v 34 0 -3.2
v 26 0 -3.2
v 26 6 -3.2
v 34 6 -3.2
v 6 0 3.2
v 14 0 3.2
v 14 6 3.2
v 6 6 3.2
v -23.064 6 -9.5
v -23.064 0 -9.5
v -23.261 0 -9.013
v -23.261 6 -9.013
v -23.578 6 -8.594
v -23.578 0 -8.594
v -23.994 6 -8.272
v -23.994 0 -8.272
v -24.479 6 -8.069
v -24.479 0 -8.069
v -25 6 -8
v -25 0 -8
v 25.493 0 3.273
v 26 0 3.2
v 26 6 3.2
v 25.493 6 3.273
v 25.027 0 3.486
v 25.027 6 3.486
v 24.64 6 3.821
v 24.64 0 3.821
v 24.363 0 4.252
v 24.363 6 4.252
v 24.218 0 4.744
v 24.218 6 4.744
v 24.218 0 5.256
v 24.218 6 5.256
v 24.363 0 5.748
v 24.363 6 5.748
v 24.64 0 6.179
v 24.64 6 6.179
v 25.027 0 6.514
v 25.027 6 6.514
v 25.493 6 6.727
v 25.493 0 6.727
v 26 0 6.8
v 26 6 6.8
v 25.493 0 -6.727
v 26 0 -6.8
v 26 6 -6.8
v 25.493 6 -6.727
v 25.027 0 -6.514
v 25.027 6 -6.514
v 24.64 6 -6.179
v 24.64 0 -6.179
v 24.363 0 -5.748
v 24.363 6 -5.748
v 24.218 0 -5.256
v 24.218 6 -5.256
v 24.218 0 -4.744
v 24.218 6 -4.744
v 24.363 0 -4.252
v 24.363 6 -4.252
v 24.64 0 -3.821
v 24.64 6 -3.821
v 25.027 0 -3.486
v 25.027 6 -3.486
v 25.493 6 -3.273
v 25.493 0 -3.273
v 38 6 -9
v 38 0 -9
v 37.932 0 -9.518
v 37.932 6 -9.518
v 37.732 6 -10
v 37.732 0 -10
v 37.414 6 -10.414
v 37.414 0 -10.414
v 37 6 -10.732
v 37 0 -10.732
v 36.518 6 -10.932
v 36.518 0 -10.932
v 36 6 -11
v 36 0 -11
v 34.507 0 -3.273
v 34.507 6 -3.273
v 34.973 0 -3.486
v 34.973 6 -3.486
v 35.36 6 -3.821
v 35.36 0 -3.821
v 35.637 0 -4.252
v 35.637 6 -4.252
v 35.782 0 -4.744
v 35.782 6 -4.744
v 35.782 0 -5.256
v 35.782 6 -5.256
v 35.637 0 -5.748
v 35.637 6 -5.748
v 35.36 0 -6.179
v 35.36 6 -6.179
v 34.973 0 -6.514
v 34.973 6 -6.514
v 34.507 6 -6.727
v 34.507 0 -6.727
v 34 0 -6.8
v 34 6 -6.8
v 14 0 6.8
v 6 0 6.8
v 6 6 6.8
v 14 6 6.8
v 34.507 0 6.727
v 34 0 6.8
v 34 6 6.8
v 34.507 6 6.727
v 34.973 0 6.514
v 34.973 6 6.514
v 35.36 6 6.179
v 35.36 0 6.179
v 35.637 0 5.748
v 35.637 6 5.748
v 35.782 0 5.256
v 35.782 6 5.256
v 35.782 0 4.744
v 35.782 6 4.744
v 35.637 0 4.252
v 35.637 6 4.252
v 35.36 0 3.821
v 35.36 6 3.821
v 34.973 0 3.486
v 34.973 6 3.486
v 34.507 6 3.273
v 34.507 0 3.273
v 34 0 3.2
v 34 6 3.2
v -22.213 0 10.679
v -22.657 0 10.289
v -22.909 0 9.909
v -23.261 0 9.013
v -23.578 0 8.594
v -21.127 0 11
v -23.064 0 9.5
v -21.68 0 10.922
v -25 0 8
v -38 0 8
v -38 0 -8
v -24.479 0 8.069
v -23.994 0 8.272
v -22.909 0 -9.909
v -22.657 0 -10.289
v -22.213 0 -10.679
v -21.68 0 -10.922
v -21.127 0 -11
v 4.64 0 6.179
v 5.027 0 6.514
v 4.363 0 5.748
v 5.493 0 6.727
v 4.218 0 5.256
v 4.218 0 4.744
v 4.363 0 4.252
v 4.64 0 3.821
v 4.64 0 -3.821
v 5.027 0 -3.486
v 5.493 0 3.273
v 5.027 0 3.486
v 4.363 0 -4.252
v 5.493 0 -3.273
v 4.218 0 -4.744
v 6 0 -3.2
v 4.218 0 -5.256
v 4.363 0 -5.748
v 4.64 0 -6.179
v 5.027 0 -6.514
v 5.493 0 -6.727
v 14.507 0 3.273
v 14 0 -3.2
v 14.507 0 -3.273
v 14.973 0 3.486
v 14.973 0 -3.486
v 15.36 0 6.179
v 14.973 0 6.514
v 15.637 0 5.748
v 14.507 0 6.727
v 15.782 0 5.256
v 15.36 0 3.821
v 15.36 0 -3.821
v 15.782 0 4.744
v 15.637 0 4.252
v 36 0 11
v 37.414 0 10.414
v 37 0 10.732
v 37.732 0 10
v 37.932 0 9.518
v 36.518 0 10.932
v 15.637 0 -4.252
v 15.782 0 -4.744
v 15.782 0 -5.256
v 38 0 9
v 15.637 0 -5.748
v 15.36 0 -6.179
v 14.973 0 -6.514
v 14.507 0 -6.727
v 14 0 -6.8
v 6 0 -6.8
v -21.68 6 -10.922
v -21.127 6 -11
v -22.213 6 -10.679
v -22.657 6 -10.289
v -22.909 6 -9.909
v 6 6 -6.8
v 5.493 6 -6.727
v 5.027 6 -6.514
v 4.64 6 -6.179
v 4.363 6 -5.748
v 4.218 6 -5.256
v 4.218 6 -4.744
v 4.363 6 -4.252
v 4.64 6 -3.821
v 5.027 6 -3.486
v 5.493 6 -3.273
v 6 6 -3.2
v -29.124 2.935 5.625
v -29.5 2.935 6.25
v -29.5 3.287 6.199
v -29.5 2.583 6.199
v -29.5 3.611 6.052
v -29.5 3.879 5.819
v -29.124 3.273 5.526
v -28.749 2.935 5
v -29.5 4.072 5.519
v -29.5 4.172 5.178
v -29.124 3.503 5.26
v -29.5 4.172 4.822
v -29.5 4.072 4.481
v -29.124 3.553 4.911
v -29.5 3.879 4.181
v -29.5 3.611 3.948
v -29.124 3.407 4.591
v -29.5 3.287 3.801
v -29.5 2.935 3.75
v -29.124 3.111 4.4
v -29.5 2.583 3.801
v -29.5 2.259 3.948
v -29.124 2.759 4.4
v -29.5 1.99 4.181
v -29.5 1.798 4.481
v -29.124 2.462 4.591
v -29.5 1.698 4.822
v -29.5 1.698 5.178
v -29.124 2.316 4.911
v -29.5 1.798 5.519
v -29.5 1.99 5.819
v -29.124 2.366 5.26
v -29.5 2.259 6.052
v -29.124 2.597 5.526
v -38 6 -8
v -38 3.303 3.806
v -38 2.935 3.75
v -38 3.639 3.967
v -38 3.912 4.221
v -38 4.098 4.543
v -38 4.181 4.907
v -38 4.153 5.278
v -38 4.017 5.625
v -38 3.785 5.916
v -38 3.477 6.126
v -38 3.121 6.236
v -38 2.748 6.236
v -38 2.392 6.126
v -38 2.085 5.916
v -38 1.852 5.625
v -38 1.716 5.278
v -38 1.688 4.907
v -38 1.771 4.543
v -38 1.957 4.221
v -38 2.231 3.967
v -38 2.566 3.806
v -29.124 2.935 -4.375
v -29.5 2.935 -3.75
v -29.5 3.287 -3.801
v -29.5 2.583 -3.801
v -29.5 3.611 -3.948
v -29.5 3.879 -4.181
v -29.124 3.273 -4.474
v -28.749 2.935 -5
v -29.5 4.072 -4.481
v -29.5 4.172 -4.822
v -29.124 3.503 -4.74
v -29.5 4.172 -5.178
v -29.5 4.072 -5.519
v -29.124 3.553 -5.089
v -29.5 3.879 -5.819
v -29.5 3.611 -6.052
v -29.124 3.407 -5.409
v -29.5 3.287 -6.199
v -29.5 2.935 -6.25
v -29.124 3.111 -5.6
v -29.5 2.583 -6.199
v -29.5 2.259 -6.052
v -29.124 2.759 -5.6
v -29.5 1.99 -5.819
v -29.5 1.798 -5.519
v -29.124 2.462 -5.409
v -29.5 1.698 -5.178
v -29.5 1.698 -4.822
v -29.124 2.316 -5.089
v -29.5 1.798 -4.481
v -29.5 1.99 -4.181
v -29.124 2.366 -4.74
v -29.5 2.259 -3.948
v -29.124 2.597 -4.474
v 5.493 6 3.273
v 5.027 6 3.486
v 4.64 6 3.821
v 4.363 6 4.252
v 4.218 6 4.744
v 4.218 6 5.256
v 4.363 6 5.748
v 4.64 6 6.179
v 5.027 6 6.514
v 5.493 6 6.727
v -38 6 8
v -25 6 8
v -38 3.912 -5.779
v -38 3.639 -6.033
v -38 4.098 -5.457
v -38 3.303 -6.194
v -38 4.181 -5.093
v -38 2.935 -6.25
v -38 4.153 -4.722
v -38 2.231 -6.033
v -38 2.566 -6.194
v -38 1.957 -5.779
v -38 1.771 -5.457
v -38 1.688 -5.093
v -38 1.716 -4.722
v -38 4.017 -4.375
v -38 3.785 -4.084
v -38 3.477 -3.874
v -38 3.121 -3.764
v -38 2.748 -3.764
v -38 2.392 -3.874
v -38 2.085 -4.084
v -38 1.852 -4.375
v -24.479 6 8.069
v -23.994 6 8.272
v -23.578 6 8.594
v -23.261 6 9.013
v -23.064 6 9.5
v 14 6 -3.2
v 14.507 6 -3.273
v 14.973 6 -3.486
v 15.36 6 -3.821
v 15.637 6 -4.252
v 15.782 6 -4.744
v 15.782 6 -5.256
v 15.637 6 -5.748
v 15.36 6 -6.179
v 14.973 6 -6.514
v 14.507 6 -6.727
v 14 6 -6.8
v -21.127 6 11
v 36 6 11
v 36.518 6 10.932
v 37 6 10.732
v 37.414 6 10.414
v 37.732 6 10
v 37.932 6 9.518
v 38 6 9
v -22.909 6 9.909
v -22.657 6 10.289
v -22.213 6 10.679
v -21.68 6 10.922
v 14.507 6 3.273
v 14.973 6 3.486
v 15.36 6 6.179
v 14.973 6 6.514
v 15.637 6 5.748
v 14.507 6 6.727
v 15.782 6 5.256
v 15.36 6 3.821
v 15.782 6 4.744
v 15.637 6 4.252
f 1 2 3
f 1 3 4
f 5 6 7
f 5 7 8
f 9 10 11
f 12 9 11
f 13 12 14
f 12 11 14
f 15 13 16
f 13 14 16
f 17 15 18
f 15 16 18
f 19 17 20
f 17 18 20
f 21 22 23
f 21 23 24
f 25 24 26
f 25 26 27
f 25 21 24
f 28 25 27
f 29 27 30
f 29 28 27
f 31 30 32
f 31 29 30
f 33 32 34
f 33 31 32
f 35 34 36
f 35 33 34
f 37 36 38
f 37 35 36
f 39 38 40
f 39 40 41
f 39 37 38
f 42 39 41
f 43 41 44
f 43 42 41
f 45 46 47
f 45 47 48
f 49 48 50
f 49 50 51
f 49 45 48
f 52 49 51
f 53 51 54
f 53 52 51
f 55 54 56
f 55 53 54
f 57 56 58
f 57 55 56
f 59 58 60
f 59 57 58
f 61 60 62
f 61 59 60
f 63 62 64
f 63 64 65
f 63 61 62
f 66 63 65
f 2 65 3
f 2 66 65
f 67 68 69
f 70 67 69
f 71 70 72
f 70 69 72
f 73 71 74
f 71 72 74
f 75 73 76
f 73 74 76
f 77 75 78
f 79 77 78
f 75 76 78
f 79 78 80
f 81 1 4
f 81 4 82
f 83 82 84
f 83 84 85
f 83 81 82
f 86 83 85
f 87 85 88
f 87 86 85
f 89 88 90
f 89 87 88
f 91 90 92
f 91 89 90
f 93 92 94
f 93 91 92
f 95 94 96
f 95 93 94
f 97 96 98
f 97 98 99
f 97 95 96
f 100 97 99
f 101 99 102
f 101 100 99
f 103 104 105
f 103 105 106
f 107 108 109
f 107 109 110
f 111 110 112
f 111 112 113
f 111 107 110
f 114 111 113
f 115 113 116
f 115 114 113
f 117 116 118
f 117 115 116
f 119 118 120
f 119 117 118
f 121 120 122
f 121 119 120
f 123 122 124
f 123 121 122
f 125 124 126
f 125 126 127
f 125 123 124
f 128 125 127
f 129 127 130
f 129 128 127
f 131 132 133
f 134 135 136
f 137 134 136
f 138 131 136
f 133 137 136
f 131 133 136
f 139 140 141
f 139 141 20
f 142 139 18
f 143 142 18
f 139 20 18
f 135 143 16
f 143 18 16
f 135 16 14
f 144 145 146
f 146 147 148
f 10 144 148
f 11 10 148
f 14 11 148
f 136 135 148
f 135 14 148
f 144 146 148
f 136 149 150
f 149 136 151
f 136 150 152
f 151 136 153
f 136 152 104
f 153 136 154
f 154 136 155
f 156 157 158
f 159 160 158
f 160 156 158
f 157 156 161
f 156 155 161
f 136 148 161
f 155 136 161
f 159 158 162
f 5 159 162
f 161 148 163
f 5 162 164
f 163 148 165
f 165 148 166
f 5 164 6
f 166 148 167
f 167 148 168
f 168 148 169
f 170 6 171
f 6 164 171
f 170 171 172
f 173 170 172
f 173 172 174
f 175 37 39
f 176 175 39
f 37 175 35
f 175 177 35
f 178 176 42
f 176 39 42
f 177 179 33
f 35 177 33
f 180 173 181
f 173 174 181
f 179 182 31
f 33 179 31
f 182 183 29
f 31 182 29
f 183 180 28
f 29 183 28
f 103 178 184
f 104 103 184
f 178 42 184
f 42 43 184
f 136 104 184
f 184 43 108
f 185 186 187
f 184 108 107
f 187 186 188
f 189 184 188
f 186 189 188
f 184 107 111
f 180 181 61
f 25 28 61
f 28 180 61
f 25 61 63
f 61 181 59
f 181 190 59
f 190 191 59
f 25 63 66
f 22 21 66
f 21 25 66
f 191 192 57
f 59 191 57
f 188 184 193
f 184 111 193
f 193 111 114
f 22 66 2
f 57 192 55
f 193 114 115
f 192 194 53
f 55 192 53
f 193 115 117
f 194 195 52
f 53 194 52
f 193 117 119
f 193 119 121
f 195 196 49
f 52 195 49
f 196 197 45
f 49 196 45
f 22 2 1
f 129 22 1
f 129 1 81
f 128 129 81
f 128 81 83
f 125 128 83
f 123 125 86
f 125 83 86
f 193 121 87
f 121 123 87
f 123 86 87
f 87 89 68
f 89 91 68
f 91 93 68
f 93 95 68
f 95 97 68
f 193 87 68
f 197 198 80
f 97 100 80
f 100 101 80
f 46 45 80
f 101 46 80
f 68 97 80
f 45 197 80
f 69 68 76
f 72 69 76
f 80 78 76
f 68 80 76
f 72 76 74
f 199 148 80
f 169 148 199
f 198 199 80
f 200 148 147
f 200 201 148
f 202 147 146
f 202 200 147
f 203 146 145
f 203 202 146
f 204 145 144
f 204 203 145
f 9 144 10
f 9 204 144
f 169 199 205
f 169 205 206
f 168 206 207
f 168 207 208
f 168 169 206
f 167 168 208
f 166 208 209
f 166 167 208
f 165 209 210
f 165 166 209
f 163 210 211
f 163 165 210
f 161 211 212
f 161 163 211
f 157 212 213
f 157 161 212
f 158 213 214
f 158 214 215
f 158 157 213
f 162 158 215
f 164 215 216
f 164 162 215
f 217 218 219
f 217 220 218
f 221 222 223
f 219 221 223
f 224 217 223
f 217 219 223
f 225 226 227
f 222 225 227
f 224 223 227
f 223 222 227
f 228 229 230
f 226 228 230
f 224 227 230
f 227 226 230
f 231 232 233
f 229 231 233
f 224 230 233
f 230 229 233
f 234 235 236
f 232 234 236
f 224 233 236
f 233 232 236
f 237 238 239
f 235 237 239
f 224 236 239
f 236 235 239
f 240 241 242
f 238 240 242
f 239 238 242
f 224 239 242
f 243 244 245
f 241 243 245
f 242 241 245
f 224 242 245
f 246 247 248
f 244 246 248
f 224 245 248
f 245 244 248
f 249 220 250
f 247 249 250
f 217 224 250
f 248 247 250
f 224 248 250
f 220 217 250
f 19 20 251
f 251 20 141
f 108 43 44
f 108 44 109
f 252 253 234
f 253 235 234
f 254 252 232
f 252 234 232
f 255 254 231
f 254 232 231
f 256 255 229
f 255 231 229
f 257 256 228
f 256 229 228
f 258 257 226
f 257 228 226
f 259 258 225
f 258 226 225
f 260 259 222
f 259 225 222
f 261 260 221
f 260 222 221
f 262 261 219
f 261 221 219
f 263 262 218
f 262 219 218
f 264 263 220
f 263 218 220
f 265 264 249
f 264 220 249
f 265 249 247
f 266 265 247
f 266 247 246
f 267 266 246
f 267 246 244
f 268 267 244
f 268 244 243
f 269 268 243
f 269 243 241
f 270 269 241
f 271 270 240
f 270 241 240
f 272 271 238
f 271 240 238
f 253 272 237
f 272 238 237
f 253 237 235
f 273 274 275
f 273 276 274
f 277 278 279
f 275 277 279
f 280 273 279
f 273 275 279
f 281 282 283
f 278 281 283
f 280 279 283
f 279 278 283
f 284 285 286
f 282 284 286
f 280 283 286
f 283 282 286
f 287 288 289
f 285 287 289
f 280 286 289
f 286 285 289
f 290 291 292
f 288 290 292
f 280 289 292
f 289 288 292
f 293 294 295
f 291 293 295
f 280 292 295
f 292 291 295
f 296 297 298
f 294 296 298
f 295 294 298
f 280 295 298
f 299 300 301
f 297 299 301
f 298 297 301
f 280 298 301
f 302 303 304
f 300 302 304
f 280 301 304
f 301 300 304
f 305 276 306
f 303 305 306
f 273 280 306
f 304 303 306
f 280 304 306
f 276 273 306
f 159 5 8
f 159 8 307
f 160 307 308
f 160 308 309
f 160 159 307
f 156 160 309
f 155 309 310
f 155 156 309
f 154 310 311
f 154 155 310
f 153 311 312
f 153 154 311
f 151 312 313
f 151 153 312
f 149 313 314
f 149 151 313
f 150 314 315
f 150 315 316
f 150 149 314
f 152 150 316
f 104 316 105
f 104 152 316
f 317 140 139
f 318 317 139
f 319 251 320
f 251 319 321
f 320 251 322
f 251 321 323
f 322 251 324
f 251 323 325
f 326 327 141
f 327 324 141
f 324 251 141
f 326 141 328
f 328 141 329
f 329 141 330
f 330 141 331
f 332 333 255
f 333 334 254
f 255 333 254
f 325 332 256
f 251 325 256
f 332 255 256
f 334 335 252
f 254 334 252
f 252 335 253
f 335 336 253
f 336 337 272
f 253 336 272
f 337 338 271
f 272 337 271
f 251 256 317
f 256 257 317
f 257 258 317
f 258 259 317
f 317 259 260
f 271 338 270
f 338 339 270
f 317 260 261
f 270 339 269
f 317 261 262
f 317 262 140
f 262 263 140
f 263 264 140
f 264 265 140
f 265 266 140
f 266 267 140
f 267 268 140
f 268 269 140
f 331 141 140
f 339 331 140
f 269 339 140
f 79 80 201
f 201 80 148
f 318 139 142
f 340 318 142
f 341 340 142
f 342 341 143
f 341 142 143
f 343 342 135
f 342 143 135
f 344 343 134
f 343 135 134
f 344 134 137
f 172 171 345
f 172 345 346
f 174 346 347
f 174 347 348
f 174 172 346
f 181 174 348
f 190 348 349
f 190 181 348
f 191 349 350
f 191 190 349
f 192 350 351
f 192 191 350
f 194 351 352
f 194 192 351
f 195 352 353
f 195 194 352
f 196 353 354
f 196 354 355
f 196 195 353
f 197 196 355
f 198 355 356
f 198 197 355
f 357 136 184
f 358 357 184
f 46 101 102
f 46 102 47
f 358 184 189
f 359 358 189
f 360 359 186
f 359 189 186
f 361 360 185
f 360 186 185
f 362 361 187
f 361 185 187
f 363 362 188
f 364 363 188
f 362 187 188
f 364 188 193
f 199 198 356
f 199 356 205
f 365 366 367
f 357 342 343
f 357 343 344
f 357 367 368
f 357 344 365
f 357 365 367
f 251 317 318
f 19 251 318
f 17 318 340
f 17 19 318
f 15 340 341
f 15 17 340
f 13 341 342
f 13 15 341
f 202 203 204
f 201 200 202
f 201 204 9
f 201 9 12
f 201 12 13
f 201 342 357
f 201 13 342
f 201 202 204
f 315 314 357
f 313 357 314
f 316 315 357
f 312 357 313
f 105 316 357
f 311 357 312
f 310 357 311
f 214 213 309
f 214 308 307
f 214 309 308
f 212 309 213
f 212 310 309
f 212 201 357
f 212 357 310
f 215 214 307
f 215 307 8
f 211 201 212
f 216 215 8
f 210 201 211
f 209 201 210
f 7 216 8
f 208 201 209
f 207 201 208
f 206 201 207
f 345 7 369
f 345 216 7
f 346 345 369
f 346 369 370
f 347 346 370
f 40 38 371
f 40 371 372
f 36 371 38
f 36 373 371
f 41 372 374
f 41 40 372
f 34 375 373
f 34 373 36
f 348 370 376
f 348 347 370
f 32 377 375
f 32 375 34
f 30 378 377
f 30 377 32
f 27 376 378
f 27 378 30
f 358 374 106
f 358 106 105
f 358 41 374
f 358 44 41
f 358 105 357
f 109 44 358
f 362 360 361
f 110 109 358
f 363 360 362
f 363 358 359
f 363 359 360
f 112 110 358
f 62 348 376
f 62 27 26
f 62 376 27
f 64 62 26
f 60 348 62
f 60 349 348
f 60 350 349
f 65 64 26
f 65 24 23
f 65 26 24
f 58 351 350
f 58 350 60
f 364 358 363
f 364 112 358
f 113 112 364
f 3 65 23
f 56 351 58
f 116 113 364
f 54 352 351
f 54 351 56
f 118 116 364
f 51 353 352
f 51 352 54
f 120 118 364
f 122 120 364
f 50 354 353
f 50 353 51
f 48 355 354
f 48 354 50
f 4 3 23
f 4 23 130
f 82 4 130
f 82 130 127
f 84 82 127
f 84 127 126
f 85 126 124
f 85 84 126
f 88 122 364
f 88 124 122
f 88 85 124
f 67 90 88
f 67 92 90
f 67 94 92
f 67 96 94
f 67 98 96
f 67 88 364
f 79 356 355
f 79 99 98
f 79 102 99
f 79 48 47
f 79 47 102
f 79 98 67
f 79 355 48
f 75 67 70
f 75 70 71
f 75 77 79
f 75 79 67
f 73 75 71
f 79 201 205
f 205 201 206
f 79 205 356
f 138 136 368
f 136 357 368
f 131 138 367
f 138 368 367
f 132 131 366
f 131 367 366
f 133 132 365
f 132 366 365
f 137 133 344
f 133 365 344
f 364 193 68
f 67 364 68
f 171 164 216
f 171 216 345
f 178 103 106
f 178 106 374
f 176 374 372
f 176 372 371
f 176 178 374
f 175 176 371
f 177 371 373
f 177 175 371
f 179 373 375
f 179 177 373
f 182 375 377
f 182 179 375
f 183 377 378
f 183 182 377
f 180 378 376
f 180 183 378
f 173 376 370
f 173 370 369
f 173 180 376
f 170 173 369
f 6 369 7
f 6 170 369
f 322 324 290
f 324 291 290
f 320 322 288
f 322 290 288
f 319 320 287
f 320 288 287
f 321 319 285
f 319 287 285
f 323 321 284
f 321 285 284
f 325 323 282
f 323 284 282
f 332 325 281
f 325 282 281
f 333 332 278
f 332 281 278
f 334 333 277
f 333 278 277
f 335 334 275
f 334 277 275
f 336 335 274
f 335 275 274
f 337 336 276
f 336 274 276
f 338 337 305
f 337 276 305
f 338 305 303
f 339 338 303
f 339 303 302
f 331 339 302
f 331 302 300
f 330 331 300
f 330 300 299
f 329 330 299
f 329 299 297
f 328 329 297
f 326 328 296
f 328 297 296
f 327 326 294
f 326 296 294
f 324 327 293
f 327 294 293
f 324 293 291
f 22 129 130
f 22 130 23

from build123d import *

# Parameters (mm, degrees)
BOSS_EXTRUDE1_DEPTH      = 6
M3_CLEARANCE_SLOT1_DEPTH = 6
M3_TAPPED_HOLE1_D        = 2.5
M3_TAPPED_HOLE1_DEPTH    = 8.5
M3_TAPPED_HOLE1_TIP      = 0.751075774
FILLET1_R                = 2


# Read off the part's stored shape, not the designer's step: M3 Clearance Slot1
with BuildPart() as part:
    # Sketch1 → Boss-Extrude1 (new body)
    with BuildSketch(Plane(origin=(0, 0, 0), x_dir=(1, 0, 0), z_dir=(0, 1, 0))):
        with BuildLine():
            Line((36, 11), (-23, 11))
            Line((-23, 11), (-23, 10))
            ThreePointArc((-23, 10), (-23.585786438, 8.585786438), (-25, 8))
            Line((-25, 8), (-38, 8))
            Line((-38, 8), (-38, -8))
            Line((-38, -8), (-25, -8))
            ThreePointArc((-25, -8), (-23.585786438, -8.585786438), (-23, -10))
            Line((-23, -10), (-23, -11))
            Line((-23, -11), (36, -11))
            ThreePointArc((36, -11), (37.414213562, -10.414213562), (38, -9))
            Line((38, -9), (38, 9))
            ThreePointArc((38, 9), (37.414213562, 10.414213562), (36, 11))
        make_face()
    extrude(amount=BOSS_EXTRUDE1_DEPTH)

    # M3 Clearance Slot1 outline → M3 Clearance Slot1 (cut)
    with BuildSketch(Plane(origin=(0, 0, 0), x_dir=(1, 0, 0), z_dir=(0, 1, 0))):
        with BuildLine():
            ThreePointArc((6, 6.8), (4.2, 5), (6, 3.2))
            Line((6, 3.2), (14, 3.2))
            ThreePointArc((14, 3.2), (15.8, 5), (14, 6.8))
            Line((14, 6.8), (6, 6.8))
        make_face()
        with BuildLine():
            ThreePointArc((34, 3.2), (35.8, 5), (34, 6.8))
            Line((34, 6.8), (26, 6.8))
            ThreePointArc((26, 6.8), (24.2, 5), (26, 3.2))
            Line((26, 3.2), (34, 3.2))
        make_face()
        with BuildLine():
            ThreePointArc((6, -3.2), (4.2, -5), (6, -6.8))
            Line((6, -6.8), (14, -6.8))
            ThreePointArc((14, -6.8), (15.8, -5), (14, -3.2))
            Line((14, -3.2), (6, -3.2))
        make_face()
        with BuildLine():
            ThreePointArc((34, -6.8), (35.8, -5), (34, -3.2))
            Line((34, -3.2), (26, -3.2))
            ThreePointArc((26, -3.2), (24.2, -5), (26, -6.8))
            Line((26, -6.8), (34, -6.8))
        make_face()
    extrude(amount=M3_CLEARANCE_SLOT1_DEPTH, mode=Mode.SUBTRACT)

    # M3 Tapped Hole1
    with Locations(Plane.ZY.offset(38)):
        with Locations((-5, 2.934782609), (5, 2.934782609)):
            Hole(M3_TAPPED_HOLE1_D / 2, depth=M3_TAPPED_HOLE1_DEPTH)
            with Locations((0, 0, -(M3_TAPPED_HOLE1_DEPTH + M3_TAPPED_HOLE1_TIP / 2))):  # 118° drill point
                Cone(0, M3_TAPPED_HOLE1_D / 2, M3_TAPPED_HOLE1_TIP, mode=Mode.SUBTRACT)

    # Fillet1
    fillet1_edges = [part.edges().sort_by_distance(p)[0] for p in [
        (-23, 3, 11),
        (-23, 3, -11),
    ]]
    fillet(fillet1_edges, radius=FILLET1_R)


solid = part.part
